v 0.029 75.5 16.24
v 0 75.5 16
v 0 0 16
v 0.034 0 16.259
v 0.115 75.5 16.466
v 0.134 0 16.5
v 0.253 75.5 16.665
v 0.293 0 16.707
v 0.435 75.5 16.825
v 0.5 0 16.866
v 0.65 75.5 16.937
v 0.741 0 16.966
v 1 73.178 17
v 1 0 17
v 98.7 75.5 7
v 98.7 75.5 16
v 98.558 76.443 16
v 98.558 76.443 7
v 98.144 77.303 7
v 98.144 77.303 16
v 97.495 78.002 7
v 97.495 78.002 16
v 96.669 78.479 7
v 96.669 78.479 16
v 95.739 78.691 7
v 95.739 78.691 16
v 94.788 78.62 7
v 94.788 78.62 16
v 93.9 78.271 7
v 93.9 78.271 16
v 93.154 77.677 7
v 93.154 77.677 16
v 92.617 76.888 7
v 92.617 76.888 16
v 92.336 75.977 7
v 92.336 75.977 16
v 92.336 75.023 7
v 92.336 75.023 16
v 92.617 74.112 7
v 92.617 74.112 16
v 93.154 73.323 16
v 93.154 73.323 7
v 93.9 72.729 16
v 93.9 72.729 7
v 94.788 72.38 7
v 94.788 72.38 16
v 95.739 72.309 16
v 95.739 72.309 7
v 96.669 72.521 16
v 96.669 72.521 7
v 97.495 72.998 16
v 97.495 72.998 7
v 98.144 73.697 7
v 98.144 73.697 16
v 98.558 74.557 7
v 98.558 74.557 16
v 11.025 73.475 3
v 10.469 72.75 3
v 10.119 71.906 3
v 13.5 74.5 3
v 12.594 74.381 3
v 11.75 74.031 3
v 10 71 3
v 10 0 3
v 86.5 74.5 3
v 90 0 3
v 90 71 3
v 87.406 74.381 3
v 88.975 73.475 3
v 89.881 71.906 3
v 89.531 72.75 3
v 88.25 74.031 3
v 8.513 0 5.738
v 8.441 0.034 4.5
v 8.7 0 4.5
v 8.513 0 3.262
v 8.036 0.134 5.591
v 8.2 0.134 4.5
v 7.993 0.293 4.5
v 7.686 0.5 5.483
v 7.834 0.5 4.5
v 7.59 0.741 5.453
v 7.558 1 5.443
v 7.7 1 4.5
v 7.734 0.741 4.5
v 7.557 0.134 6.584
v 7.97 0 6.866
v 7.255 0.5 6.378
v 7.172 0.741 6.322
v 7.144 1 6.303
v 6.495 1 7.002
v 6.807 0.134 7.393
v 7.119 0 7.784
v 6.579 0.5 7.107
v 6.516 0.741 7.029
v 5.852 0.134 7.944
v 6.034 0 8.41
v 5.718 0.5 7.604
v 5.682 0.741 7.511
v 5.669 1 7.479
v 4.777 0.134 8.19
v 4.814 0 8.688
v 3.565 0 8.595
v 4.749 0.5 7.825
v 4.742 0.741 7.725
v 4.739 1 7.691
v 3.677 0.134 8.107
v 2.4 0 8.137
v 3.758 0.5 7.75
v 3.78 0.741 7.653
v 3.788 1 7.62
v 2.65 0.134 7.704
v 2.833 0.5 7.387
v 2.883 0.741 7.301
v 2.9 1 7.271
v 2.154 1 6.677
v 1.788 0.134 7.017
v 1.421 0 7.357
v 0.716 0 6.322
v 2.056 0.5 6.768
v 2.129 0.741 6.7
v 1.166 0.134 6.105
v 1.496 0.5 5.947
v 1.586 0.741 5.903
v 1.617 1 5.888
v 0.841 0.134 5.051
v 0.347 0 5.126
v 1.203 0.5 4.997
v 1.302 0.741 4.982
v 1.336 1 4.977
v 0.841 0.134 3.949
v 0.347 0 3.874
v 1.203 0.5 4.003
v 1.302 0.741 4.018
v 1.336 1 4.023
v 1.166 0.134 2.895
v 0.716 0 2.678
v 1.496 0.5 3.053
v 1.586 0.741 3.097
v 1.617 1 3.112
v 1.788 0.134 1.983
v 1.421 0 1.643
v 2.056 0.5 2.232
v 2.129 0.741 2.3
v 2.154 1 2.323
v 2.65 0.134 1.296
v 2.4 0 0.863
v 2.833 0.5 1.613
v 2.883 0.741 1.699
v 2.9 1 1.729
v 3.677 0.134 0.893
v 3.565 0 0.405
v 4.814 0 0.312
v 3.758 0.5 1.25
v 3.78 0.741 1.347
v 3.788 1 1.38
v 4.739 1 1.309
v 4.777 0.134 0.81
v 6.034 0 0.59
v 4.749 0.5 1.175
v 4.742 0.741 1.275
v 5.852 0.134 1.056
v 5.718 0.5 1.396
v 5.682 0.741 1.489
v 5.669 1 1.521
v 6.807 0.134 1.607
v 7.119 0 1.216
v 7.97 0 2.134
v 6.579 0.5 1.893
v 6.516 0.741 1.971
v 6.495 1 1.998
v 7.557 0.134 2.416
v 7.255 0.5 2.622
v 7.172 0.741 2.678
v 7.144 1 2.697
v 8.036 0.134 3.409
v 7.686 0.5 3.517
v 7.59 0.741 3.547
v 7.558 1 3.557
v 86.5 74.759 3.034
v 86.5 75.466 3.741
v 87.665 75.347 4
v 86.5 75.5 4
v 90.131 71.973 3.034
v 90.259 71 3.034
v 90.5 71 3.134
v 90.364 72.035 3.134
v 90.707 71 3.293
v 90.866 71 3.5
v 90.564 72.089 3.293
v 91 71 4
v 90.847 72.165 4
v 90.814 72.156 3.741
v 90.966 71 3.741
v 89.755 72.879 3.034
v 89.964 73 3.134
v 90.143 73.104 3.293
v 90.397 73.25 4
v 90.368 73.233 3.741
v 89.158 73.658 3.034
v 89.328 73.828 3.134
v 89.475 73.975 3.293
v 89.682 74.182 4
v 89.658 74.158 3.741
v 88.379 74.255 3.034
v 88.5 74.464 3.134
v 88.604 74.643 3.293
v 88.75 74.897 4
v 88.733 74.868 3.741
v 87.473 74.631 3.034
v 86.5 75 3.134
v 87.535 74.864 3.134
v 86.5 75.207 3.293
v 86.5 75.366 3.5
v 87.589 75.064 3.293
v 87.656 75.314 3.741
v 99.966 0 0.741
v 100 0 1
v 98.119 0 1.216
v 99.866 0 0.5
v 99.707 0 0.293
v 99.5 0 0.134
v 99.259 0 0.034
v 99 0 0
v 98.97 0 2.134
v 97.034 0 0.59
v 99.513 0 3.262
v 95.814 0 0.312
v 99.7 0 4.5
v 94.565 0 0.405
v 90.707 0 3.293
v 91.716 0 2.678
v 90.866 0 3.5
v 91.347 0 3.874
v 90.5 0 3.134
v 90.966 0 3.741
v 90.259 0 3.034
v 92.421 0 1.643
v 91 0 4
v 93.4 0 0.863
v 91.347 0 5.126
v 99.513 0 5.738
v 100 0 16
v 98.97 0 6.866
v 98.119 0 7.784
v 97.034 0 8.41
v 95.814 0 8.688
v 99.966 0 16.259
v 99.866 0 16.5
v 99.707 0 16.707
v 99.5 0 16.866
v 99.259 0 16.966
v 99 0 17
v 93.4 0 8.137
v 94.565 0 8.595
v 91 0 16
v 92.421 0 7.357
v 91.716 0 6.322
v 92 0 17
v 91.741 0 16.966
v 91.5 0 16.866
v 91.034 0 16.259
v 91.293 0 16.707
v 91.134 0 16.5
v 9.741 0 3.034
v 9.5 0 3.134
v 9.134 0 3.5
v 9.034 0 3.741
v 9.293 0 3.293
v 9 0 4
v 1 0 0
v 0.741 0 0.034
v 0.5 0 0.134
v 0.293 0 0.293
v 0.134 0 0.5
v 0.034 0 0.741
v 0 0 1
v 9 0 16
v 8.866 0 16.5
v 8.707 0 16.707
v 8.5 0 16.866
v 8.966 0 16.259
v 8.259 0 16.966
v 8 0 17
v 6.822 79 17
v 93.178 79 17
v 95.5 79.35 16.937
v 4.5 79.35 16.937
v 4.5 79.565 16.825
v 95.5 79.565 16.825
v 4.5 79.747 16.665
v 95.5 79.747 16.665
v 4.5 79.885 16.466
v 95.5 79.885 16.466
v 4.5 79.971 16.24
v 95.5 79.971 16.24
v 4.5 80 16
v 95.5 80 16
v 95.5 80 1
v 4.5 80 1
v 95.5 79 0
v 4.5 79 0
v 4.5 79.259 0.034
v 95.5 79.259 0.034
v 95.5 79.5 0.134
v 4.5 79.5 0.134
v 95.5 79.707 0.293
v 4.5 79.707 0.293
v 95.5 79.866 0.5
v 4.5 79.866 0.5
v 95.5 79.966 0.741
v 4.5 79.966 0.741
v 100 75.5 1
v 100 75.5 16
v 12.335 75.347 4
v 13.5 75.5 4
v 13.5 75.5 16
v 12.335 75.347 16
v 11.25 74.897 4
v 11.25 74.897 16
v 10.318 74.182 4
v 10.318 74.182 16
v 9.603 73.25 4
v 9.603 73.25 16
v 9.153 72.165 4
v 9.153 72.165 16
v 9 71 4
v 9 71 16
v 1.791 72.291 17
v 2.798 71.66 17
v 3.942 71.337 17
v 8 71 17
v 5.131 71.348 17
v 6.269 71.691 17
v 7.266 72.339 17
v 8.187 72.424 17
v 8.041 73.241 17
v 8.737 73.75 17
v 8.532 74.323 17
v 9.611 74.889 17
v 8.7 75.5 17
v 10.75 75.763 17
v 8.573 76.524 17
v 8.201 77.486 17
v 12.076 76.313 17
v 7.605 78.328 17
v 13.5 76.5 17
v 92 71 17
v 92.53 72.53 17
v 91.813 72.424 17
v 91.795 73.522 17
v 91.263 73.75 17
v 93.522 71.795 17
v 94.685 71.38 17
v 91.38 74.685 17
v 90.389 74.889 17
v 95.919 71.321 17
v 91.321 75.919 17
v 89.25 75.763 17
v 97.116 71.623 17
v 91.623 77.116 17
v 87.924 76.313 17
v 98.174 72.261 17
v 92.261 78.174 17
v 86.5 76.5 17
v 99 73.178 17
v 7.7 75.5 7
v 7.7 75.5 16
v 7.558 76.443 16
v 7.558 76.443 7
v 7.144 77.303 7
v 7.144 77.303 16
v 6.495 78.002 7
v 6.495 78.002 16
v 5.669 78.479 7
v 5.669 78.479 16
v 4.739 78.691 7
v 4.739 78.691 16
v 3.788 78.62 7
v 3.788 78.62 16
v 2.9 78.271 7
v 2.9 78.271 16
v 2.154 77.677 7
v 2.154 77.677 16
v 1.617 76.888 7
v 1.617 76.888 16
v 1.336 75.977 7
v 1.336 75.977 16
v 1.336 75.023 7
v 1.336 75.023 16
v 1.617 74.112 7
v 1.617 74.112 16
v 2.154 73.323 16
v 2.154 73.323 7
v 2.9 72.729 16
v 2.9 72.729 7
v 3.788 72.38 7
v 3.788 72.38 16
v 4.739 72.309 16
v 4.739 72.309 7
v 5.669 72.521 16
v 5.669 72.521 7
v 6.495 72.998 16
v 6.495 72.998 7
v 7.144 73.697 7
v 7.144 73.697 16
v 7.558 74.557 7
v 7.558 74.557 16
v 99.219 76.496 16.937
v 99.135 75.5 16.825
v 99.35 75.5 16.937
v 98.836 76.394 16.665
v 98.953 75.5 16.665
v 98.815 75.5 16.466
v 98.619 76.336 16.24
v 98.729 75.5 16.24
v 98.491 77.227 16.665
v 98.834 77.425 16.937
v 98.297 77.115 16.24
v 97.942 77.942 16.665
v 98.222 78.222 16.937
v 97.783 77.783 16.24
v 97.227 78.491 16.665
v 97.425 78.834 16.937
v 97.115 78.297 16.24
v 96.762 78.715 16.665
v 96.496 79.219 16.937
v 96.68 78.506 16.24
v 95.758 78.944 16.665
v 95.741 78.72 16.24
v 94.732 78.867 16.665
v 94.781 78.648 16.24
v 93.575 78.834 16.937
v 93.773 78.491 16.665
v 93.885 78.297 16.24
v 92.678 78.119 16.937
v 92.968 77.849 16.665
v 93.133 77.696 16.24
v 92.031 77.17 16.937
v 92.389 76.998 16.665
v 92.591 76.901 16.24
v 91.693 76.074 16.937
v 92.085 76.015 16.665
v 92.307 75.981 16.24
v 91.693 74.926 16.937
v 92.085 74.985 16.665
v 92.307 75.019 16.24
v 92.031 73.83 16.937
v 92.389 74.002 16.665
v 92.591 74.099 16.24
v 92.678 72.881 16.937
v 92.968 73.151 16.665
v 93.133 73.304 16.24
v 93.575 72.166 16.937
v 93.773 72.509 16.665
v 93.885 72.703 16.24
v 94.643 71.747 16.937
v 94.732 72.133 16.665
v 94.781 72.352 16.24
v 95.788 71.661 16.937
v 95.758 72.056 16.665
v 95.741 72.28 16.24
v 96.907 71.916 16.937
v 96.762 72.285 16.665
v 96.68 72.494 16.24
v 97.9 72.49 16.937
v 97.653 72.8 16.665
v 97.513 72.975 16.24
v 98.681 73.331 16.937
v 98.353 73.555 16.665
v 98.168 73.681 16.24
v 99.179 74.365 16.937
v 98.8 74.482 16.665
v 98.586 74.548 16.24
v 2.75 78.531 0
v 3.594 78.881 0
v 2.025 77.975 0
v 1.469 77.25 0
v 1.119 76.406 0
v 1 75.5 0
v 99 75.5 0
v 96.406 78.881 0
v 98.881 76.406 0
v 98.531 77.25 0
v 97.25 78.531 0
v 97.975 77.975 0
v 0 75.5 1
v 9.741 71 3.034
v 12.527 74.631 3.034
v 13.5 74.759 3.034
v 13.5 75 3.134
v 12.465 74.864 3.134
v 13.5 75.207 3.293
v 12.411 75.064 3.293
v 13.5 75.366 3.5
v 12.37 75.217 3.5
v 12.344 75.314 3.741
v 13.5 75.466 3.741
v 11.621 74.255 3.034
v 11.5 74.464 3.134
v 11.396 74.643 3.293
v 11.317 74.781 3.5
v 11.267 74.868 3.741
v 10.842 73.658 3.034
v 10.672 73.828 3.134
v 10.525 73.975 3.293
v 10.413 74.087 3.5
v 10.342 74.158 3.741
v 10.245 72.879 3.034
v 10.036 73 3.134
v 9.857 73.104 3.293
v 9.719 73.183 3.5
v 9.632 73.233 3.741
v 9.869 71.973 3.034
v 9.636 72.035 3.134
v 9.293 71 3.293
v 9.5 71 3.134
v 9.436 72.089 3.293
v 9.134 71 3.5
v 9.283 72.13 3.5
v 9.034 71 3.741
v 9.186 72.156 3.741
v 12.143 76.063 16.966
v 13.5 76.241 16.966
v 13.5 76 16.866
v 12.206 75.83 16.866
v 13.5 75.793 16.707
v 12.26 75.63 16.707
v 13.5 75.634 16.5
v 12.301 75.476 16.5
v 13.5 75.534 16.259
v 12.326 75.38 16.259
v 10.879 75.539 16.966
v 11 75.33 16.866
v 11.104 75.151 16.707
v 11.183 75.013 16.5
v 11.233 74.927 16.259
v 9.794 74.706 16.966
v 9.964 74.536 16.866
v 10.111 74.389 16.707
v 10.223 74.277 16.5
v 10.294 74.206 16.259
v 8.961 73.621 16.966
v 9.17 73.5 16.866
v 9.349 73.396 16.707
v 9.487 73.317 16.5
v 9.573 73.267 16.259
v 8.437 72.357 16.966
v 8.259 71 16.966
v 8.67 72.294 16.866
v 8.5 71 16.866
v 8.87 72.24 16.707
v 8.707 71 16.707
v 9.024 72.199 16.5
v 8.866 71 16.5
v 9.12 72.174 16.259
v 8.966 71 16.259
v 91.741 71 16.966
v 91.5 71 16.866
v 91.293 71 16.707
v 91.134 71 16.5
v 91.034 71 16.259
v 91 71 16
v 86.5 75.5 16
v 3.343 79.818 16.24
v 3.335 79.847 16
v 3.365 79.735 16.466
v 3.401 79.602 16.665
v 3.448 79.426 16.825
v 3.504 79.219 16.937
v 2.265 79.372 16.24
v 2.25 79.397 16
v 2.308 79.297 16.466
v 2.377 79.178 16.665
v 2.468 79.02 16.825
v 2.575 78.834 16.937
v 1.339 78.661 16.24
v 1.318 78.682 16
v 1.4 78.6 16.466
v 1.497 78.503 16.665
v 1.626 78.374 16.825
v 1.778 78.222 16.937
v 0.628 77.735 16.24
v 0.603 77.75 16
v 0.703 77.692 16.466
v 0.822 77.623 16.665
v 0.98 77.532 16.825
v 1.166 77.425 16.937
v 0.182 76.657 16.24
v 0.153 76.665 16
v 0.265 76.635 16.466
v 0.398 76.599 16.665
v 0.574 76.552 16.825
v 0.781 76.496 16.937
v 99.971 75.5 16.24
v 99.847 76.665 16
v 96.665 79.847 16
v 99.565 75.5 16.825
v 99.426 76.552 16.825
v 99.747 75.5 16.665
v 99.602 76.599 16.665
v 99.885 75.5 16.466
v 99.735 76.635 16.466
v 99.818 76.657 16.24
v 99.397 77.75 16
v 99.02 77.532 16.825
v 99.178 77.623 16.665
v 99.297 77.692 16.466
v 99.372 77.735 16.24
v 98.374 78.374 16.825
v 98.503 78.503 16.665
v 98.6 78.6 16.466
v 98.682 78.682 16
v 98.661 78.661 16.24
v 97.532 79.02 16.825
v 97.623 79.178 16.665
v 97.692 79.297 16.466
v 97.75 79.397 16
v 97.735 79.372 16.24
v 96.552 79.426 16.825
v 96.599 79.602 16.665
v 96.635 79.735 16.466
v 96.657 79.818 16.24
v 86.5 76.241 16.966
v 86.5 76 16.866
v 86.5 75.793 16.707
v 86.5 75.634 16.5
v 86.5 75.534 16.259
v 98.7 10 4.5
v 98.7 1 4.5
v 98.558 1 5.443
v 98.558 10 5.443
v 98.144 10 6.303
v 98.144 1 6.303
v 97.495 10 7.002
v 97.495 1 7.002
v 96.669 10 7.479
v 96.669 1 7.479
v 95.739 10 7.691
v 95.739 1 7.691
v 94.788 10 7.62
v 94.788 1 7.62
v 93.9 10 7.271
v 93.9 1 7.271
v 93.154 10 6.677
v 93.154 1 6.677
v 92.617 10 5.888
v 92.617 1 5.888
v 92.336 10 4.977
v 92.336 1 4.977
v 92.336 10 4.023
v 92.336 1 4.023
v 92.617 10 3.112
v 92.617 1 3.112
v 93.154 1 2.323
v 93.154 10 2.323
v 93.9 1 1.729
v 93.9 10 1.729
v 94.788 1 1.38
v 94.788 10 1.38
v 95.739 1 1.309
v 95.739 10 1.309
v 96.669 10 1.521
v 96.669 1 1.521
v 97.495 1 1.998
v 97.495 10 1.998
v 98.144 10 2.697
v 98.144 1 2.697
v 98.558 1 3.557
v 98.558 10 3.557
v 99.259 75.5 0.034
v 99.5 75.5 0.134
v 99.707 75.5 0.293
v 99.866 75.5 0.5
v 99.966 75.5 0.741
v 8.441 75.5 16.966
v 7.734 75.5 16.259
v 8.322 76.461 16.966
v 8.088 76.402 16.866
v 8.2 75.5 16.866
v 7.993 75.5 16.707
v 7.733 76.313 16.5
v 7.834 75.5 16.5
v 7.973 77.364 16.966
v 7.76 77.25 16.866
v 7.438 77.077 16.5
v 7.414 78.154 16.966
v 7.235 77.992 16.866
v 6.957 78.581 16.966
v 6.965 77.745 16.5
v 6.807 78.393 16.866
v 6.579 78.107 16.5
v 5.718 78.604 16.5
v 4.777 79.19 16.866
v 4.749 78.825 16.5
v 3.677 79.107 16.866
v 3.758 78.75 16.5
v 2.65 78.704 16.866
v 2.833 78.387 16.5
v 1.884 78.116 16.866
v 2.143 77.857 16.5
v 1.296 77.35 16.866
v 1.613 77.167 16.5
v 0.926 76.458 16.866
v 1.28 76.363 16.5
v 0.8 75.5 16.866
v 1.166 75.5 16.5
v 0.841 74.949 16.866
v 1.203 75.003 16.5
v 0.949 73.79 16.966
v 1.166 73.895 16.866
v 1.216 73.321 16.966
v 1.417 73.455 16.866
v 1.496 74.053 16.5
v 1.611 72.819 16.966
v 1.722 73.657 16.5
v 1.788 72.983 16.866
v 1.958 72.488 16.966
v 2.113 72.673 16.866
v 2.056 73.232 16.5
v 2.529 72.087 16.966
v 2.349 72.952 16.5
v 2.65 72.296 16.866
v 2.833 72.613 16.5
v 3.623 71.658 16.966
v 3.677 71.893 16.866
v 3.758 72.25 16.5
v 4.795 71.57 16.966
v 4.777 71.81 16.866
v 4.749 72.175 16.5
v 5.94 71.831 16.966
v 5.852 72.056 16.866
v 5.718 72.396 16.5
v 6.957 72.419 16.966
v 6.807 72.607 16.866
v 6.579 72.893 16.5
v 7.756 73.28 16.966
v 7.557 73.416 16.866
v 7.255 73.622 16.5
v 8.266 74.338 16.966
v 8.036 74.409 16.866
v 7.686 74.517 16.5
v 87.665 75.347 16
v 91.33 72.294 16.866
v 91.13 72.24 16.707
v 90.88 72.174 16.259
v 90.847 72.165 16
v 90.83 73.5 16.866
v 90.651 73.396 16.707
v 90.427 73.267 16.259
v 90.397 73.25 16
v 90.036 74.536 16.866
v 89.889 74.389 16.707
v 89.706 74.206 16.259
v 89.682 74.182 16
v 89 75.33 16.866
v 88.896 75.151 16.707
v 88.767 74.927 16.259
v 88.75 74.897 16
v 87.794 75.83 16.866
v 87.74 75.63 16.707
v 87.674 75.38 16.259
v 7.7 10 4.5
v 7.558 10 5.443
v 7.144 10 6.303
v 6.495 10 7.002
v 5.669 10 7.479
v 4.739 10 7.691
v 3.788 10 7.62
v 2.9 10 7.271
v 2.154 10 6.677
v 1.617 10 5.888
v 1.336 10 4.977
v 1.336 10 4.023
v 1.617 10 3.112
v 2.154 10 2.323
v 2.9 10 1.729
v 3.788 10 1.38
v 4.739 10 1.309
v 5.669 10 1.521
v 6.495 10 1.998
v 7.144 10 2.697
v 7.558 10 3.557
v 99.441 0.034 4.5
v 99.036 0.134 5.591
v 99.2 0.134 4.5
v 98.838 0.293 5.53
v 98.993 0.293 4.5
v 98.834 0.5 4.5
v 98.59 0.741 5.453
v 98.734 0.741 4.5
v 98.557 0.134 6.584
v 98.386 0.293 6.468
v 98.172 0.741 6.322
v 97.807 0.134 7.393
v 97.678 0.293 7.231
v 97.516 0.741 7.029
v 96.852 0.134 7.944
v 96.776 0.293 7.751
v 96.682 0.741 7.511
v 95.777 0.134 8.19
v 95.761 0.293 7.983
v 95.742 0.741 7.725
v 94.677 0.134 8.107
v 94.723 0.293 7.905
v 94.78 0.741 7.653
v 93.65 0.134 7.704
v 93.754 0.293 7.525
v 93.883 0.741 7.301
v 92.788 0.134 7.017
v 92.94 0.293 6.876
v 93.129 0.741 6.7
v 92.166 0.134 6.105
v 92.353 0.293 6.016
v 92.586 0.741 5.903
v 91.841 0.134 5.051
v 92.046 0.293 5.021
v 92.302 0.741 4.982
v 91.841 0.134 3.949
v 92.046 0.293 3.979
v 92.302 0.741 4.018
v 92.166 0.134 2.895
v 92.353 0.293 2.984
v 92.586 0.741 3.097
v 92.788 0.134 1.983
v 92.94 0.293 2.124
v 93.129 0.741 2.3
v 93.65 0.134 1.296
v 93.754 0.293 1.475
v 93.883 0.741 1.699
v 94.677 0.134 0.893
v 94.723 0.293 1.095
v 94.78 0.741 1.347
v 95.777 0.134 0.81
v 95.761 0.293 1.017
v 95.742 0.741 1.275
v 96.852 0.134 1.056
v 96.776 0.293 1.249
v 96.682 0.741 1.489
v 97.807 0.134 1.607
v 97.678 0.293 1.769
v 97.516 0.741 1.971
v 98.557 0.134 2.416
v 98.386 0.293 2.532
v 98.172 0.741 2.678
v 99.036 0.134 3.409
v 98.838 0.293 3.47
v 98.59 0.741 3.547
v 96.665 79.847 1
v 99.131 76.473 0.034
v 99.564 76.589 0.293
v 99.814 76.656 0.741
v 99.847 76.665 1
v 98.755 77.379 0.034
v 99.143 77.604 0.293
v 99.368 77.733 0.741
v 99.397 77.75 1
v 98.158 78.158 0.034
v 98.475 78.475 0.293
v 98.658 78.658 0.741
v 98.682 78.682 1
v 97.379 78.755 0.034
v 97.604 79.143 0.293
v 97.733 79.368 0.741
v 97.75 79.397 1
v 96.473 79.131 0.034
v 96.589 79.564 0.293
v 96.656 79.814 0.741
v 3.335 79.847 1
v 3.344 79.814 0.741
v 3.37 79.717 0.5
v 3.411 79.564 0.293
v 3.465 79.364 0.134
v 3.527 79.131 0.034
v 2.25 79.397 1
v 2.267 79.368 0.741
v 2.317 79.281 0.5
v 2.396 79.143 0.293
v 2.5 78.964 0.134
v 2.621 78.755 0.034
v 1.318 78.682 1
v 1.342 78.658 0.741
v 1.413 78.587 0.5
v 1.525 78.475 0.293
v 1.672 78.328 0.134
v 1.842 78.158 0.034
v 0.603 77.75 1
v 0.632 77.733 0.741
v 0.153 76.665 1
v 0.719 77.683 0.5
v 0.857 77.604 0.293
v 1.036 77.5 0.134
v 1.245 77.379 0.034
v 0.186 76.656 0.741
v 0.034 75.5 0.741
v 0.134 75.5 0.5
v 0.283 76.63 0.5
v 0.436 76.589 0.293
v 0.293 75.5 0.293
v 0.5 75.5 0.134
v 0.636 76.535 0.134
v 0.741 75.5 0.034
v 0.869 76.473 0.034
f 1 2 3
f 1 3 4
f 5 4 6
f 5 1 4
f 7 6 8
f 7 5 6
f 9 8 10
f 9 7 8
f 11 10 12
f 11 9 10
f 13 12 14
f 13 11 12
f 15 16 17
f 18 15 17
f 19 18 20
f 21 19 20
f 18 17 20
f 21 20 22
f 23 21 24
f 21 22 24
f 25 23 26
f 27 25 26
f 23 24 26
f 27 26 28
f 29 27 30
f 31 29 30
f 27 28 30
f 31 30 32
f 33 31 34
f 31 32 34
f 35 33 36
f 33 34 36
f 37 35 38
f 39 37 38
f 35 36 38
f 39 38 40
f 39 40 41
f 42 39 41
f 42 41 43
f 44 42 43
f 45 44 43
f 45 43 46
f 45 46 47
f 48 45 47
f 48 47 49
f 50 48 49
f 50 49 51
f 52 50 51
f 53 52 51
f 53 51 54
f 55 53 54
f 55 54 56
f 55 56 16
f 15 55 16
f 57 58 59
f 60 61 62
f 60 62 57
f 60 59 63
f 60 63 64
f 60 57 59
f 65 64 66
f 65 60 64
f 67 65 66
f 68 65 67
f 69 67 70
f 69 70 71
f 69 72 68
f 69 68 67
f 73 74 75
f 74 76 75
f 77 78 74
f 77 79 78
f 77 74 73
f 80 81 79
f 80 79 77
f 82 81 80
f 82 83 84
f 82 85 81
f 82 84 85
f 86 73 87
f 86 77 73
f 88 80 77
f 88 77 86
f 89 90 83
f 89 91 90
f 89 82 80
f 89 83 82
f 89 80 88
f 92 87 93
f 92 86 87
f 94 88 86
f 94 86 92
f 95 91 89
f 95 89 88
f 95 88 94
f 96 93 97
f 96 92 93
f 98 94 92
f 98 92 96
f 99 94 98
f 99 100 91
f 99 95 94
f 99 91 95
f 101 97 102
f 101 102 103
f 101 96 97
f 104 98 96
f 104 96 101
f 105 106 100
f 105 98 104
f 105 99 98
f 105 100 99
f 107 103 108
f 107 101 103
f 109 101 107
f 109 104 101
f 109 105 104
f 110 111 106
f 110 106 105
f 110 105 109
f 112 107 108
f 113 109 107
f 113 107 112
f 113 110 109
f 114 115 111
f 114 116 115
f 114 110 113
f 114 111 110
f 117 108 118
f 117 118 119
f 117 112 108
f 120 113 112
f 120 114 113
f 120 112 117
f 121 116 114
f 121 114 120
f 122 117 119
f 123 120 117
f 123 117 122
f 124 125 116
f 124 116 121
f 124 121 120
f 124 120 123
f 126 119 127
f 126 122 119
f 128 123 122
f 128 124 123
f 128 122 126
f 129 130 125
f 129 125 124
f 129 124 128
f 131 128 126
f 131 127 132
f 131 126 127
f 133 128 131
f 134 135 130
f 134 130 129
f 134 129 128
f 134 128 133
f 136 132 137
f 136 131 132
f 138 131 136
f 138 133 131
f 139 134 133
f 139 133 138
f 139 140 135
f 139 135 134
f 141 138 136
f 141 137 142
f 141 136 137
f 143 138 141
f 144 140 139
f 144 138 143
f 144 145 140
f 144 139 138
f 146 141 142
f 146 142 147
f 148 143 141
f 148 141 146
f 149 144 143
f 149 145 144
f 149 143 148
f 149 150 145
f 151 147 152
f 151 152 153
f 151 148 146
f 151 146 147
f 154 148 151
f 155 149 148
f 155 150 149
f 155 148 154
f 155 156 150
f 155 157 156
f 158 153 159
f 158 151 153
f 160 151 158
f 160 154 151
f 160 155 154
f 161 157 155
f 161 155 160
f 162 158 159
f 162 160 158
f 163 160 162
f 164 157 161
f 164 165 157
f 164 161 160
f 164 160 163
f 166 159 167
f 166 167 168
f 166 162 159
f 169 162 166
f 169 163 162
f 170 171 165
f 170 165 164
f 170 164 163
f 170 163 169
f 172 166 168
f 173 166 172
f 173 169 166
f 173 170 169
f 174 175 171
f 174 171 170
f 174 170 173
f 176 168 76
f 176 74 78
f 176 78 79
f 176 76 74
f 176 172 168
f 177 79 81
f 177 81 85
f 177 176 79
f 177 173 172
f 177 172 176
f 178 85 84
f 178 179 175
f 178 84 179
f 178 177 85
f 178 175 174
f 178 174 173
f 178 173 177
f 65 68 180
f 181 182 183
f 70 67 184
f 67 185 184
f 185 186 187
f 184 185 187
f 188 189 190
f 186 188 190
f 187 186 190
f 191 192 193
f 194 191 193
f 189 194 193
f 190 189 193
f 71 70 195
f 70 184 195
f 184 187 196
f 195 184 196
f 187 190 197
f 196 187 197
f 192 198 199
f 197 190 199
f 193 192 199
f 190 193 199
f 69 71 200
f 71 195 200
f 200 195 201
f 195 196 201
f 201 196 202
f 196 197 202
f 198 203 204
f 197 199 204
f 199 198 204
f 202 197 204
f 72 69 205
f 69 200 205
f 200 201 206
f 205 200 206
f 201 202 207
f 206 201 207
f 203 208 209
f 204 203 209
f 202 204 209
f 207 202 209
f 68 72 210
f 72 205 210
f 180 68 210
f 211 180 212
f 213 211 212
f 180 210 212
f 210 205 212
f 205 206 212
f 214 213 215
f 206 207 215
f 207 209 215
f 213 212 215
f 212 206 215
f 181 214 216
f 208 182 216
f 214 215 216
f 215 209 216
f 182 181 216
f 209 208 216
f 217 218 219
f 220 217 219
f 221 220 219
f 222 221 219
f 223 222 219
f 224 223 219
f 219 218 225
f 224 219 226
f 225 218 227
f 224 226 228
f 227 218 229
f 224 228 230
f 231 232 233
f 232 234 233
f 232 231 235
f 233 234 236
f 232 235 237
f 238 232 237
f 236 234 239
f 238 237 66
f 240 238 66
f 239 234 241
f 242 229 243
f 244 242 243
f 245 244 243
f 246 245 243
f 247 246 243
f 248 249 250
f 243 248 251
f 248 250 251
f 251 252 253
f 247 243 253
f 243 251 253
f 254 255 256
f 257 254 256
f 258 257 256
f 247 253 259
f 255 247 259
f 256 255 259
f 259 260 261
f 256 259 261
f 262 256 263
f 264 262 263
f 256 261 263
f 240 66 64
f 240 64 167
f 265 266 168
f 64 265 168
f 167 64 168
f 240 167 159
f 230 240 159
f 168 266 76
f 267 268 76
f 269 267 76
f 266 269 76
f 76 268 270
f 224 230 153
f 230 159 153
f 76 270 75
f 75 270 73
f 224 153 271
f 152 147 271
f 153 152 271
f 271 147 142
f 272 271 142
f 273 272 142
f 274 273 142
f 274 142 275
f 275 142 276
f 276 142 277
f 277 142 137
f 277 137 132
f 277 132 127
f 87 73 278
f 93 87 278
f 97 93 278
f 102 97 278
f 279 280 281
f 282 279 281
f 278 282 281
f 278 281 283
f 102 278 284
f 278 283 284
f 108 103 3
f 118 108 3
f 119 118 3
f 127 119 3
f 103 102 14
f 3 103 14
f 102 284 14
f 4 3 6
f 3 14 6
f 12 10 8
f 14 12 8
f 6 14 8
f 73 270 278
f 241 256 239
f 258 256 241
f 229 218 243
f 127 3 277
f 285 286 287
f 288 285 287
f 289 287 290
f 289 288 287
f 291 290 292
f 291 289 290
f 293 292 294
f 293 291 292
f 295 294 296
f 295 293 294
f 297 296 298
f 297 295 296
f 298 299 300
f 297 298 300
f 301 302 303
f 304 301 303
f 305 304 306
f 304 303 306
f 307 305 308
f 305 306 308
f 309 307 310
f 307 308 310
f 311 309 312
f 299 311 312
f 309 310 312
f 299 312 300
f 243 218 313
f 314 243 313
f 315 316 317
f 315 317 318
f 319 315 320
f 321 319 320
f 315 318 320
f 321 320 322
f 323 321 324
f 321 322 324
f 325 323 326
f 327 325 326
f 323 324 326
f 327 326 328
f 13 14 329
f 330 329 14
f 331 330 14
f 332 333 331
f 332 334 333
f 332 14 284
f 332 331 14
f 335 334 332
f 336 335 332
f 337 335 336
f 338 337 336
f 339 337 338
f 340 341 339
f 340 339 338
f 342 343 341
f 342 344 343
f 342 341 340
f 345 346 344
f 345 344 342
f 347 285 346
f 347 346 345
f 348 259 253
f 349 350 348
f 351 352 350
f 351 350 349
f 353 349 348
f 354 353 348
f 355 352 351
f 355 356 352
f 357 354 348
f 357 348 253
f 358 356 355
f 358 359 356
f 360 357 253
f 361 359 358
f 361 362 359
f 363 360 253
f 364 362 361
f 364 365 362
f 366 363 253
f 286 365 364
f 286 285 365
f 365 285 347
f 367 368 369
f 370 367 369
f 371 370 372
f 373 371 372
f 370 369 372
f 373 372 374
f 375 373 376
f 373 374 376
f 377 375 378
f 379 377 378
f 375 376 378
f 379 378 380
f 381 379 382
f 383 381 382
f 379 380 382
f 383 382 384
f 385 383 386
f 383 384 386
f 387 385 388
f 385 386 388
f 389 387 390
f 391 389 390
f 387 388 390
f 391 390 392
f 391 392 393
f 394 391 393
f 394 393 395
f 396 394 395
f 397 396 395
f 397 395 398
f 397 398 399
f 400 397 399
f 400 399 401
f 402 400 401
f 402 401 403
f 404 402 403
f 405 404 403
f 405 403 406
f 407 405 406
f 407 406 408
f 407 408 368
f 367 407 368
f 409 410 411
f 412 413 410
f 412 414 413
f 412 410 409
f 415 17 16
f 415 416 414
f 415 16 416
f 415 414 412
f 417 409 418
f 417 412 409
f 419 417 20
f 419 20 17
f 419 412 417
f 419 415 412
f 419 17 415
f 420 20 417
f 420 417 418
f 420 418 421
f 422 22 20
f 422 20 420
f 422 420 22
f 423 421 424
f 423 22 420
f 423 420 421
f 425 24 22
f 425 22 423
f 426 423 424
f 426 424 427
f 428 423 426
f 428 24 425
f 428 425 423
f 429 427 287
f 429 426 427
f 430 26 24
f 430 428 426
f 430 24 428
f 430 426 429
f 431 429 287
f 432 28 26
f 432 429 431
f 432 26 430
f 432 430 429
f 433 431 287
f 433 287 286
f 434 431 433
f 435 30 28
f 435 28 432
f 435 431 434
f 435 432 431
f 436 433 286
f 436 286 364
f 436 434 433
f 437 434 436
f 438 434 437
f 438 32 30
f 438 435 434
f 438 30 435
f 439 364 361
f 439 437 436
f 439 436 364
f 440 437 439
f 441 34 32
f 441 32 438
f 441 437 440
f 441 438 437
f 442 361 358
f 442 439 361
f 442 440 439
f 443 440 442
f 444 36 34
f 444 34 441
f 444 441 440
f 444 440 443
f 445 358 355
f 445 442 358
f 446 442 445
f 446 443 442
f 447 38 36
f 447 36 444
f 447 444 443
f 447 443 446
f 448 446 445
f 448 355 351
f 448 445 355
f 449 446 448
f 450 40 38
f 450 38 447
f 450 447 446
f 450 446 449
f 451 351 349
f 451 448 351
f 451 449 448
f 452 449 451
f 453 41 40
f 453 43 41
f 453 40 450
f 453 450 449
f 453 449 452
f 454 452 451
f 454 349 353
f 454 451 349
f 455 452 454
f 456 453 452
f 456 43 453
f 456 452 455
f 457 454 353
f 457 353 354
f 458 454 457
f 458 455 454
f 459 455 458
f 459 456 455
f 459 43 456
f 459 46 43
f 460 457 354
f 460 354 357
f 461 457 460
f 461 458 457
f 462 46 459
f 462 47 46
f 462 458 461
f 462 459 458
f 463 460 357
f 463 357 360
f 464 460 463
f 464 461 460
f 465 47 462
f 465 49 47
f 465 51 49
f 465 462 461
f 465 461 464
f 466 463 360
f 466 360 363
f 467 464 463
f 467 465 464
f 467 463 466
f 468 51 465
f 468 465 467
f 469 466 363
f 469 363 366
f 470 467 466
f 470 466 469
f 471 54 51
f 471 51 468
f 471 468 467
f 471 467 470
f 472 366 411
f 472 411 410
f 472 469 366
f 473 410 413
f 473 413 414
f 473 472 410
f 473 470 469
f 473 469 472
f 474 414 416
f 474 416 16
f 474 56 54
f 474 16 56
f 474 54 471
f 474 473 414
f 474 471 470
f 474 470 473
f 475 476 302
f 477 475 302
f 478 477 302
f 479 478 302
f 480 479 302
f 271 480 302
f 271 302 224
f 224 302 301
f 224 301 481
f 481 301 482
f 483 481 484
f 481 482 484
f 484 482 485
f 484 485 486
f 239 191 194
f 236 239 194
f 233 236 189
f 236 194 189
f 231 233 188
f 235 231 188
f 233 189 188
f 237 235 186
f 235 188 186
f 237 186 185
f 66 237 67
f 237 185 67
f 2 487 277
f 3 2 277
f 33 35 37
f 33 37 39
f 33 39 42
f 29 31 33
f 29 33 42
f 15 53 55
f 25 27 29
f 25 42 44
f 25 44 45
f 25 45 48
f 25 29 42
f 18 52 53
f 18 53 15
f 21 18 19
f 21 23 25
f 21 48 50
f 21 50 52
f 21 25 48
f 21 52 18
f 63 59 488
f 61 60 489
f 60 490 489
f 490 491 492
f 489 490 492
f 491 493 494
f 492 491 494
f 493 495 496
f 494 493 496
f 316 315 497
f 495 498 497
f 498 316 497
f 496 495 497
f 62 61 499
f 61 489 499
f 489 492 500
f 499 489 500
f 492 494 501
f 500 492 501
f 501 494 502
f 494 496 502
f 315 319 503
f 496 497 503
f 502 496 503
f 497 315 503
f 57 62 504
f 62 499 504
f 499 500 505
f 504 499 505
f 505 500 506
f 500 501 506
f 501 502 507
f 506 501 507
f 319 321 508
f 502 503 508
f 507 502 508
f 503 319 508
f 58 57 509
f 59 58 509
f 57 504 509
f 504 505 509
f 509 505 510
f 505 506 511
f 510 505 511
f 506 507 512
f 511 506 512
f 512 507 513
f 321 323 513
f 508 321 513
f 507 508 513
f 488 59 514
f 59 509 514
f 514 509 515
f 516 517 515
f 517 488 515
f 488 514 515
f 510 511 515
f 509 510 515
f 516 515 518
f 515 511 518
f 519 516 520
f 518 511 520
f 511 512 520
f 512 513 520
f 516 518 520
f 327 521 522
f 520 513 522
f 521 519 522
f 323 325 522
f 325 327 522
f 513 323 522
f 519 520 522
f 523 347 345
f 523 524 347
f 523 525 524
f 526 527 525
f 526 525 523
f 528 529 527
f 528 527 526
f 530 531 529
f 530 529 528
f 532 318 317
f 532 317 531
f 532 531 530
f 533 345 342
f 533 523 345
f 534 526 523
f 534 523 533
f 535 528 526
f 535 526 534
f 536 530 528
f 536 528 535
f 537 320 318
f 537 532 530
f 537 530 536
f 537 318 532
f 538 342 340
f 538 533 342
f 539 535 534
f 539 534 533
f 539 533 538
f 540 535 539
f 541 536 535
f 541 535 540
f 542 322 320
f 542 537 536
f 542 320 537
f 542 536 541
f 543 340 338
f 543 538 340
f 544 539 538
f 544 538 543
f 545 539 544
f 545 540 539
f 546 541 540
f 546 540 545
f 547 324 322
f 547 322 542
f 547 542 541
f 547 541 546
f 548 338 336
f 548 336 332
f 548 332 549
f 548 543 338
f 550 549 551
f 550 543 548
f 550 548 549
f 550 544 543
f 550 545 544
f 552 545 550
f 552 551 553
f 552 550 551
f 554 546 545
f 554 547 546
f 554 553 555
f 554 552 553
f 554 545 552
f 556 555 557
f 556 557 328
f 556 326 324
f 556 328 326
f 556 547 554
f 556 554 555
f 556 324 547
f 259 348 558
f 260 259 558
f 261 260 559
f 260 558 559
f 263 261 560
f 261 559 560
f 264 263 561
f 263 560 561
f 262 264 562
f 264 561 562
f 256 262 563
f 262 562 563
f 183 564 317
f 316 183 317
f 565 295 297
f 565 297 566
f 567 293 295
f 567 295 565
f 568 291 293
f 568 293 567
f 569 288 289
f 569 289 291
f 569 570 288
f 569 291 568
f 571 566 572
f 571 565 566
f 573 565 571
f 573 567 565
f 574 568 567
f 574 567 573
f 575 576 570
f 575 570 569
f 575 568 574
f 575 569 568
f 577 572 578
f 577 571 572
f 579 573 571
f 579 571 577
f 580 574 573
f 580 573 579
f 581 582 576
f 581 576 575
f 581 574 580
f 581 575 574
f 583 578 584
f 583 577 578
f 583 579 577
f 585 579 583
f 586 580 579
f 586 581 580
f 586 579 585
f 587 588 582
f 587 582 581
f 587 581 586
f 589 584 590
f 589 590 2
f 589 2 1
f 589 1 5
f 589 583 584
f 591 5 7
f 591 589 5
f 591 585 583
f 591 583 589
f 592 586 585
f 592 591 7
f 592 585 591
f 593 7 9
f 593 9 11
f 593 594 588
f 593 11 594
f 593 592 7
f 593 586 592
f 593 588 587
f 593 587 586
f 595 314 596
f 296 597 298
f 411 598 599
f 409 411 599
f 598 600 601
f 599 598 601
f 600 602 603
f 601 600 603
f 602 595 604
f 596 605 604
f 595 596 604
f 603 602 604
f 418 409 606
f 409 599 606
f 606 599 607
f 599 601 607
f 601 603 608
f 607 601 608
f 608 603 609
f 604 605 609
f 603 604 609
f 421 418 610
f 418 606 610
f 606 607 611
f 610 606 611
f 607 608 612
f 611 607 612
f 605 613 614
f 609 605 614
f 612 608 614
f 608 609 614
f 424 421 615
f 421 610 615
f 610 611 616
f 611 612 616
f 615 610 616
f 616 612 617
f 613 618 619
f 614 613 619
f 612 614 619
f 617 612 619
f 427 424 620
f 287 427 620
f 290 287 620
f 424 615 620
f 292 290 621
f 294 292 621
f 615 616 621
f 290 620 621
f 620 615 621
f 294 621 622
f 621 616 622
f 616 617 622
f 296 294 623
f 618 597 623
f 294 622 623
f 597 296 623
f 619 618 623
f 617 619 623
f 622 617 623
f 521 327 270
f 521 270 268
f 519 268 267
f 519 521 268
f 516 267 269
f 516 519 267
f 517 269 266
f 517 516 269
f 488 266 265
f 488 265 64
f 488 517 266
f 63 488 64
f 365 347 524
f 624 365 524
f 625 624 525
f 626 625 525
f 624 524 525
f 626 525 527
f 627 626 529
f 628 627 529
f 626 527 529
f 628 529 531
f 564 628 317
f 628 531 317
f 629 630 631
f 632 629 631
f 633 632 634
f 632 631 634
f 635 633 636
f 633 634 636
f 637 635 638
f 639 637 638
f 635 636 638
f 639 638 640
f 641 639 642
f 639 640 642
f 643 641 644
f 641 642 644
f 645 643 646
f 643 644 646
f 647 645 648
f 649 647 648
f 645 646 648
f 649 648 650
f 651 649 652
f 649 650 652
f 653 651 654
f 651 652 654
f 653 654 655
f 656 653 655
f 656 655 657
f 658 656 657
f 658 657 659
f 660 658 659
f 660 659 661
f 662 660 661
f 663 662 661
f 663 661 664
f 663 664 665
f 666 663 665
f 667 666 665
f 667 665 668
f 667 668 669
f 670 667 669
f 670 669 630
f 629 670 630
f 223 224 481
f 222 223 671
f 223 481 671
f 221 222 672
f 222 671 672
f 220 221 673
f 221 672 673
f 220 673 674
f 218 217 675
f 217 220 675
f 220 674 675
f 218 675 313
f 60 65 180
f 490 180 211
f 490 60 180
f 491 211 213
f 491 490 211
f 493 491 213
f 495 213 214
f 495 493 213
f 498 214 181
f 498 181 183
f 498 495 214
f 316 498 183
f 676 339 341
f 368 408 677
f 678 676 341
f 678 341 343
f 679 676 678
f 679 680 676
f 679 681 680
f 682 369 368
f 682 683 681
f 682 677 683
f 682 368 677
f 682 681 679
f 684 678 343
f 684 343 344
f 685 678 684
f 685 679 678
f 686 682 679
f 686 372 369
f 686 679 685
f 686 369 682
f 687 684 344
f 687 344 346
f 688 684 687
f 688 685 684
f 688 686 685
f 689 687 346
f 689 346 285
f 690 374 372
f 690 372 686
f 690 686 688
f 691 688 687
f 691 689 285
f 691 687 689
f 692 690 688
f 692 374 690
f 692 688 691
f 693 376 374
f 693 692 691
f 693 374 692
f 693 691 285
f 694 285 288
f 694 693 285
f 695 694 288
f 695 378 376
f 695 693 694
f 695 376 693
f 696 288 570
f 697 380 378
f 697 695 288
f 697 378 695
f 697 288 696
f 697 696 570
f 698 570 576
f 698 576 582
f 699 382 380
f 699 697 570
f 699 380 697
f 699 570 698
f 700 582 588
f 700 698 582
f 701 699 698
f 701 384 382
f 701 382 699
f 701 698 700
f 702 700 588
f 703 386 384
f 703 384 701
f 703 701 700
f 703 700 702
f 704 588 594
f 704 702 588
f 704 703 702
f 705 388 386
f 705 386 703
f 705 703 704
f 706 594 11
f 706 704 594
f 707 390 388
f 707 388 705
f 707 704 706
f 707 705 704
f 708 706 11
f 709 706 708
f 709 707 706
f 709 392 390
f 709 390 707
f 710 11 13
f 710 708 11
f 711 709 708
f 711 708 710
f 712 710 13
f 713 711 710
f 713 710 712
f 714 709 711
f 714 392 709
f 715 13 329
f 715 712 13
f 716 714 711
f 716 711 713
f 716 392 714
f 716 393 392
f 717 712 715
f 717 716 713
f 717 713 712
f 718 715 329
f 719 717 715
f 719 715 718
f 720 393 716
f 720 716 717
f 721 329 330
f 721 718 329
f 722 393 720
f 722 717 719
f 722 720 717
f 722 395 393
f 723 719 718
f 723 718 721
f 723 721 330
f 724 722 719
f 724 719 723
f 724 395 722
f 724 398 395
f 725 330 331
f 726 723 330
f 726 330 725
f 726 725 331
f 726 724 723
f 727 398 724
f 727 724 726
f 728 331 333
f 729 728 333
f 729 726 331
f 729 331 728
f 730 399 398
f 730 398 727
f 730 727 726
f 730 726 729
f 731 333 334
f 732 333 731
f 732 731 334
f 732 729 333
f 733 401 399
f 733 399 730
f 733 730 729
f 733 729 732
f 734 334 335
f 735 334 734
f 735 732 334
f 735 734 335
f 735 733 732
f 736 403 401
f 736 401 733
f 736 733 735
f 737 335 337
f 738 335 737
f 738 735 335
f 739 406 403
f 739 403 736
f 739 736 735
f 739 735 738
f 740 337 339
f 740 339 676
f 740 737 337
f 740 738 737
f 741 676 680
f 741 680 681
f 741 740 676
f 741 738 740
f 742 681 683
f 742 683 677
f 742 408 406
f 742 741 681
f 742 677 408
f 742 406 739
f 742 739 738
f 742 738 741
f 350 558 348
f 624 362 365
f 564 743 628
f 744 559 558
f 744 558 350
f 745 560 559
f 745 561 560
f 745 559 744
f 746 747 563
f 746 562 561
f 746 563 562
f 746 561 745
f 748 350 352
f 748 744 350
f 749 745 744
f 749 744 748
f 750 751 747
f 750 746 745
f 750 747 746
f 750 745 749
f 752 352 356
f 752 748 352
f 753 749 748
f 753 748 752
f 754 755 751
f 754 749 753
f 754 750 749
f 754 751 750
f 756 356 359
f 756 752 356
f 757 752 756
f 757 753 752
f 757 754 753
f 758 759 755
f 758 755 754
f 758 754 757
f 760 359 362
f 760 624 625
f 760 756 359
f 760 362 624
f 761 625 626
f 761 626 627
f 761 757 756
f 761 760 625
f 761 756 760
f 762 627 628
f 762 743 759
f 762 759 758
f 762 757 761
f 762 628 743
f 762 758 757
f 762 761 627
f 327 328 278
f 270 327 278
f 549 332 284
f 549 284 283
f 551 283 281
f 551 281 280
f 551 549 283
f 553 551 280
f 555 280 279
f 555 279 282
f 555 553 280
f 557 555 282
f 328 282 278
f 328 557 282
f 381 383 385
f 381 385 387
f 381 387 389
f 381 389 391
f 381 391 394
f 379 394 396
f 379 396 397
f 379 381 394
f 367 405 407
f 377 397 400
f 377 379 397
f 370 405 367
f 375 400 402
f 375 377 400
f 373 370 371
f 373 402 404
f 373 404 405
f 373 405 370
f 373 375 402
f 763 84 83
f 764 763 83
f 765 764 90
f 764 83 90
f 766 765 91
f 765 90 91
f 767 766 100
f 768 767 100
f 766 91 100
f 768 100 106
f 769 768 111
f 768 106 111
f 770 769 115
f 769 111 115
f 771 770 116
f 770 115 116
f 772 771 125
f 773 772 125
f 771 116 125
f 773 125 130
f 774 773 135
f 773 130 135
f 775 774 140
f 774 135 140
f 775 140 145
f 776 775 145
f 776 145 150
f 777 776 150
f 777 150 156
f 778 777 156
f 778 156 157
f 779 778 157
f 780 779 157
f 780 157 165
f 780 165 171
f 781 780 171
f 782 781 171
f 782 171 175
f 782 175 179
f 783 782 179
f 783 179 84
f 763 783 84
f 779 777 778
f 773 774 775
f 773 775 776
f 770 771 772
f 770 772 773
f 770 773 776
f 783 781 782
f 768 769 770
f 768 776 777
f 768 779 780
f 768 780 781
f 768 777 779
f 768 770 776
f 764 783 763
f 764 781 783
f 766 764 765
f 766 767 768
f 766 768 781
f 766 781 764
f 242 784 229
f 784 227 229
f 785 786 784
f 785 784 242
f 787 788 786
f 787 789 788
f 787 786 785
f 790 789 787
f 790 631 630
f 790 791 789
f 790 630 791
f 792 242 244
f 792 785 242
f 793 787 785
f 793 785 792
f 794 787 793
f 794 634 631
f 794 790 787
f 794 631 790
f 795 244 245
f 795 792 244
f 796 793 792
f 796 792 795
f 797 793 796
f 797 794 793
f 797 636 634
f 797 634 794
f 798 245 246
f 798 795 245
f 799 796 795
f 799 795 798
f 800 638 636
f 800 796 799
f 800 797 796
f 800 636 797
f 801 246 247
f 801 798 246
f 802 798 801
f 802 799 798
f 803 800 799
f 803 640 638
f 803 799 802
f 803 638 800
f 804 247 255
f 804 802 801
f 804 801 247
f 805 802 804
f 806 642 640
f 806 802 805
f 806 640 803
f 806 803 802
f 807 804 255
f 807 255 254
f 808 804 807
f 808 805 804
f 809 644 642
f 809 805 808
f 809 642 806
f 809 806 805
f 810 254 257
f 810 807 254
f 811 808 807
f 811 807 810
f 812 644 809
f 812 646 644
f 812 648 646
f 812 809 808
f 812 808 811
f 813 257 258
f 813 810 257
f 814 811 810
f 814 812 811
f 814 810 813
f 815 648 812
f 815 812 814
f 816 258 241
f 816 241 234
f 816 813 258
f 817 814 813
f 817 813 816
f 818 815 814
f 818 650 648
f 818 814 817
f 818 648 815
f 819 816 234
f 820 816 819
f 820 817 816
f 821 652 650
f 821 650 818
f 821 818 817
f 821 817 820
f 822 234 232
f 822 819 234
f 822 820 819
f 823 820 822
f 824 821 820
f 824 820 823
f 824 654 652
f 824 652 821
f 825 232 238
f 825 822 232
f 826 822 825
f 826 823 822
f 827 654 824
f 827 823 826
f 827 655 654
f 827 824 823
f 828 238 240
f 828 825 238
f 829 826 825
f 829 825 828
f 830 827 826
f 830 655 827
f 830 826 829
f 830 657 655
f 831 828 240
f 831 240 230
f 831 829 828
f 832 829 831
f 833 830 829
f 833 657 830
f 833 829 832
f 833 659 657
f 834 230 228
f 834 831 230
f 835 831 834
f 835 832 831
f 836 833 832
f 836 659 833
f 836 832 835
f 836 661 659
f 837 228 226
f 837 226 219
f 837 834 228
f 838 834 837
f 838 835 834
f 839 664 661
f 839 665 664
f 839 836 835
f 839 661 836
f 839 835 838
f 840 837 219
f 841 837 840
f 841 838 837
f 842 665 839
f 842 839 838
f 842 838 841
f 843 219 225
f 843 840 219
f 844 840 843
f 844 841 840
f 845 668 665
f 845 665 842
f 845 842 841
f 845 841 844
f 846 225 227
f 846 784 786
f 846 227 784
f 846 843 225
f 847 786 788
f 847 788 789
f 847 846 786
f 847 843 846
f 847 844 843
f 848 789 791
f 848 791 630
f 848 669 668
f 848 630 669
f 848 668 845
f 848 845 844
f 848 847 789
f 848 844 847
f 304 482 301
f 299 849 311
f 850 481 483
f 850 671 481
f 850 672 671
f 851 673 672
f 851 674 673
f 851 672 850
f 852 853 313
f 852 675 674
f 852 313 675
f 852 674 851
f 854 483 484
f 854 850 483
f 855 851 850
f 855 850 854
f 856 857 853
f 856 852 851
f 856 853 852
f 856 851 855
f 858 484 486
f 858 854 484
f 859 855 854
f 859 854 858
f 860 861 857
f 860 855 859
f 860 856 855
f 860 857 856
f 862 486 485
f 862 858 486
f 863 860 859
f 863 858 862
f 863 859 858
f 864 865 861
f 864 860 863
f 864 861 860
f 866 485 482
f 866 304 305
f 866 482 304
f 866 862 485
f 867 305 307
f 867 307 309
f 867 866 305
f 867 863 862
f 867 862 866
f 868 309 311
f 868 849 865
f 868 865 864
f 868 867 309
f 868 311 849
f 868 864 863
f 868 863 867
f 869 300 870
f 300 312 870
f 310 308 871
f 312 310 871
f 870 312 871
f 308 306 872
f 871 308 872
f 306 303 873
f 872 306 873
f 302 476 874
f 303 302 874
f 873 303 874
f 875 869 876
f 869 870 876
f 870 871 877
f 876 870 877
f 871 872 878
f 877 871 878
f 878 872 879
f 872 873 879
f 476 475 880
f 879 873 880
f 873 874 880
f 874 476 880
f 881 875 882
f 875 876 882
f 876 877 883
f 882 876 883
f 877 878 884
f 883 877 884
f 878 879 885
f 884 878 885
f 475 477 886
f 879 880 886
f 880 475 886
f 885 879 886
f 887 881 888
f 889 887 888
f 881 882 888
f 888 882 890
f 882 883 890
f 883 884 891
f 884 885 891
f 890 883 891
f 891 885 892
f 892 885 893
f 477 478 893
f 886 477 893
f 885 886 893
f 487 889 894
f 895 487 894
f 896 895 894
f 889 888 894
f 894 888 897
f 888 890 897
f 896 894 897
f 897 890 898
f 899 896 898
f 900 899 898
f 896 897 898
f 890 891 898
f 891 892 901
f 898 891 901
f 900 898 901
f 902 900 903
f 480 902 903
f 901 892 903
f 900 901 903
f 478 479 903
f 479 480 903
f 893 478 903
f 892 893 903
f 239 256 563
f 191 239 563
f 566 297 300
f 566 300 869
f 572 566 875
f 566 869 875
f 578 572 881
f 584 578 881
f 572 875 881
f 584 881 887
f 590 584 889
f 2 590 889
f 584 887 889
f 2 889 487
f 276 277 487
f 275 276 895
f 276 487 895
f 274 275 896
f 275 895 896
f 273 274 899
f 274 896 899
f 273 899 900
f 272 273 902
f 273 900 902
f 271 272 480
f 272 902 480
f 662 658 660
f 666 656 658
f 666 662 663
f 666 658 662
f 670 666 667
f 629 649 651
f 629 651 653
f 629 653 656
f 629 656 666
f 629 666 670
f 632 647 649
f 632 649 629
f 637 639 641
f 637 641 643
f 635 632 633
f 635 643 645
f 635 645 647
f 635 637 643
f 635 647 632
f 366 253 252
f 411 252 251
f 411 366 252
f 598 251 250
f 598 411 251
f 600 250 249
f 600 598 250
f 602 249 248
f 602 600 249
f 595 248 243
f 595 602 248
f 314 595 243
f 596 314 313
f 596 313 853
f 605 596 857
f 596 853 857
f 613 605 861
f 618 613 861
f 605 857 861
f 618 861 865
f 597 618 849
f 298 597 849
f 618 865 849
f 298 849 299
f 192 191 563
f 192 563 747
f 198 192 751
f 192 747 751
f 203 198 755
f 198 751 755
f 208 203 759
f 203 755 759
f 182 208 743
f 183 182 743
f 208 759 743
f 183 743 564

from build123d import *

# Parameters (mm, degrees)
F1_DEPTH     = 17
F5_DEPTH     = 14
F3_R         = 3.2
F6_DEPTH     = 10
F4_R         = 3.2
F7_DEPTH     = 10
F8_T1_DEPTH  = 73
F8_T3_DEPTH  = 71
F8_T6_ANGLE  = 90
F8_T8_ANGLE  = 90
F8_T9_DEPTH  = 78
F8_T11_DEPTH = 73.5
F8_T13_DEPTH = 73
F8_T15_DEPTH = 91
F8_T26_ANGLE = 90
F8_T28_ANGLE = 90
F8_T30_ANGLE = 90
F8_T32_ANGLE = 90
F8_T34_ANGLE = 90
F8_T36_ANGLE = 90


# Not quite as in the source:
# - a fillet or chamfer that OpenCascade refuses, or shapes differently, is made with other operations: its cross-section is extruded or revolved along the edge and cut away or added


with BuildPart() as f1:
    # F0 (on Top) → F1 (new body)
    with BuildSketch(Plane.XY):
        with BuildLine():
            Line((0, 75.5), (0, 0))
            Line((0, 0), (50, 0))
            Line((50, 0), (100, 0))
            Line((100, 0), (100, 75.5))
            ThreePointArc((100, 75.5), (98.6819805153, 78.6819805153), (95.5, 80))
            Line((95.5, 80), (50, 80))
            Line((50, 80), (4.5, 80))
            ThreePointArc((4.5, 80), (1.3180194847, 78.6819805153), (0, 75.5))
        make_face()
    extrude(amount=F1_DEPTH)

    # F3 (on offset) → F5 (cut)
    with BuildSketch(Plane.XY.offset(17)):
        with BuildLine():
            Line((9, 71), (9, 0))
            Line((9, 0), (50, 0))
            Line((50, 0), (91, 0))
            Line((91, 0), (91, 71))
            ThreePointArc((91, 71), (89.6819805153, 74.1819805153), (86.5, 75.5))
            Line((86.5, 75.5), (50, 75.5))
            Line((50, 75.5), (13.5, 75.5))
            ThreePointArc((13.5, 75.5), (10.3180194847, 74.1819805153), (9, 71))
        make_face()
    extrude(amount=-F5_DEPTH, mode=Mode.SUBTRACT)

    # F3 (on offset) → F6 (cut)
    with BuildSketch(Plane.XY.offset(17)):
        with Locations((4.5, 75.5)):
            Circle(F3_R)
        with Locations((95.5, 75.5)):
            Circle(F3_R)
    extrude(amount=-F6_DEPTH, mode=Mode.SUBTRACT)

    # F4 (on Front) → F7 (cut)
    with BuildSketch(Plane.XZ):
        with Locations((4.5, 4.5)):
            Circle(F4_R)
        with Locations((95.5, 4.5)):
            Circle(F4_R)
    extrude(amount=-F7_DEPTH, mode=Mode.SUBTRACT)

    # F8: fillet of radius 1 on 8 edges, made by hand

    # F8_s2 → F8_t1 (join)
    with BuildSketch(Plane.YZ.offset(13.5)):
        with BuildLine():
            ThreePointArc((74.5, 3), (75.2071067812, 3.2928932188), (75.5, 4))
            Line((75.5, 4), (75.5, 3))
            Line((75.5, 3), (74.5, 3))
        make_face()
    extrude(amount=F8_T1_DEPTH)

    # F8_s4 → F8_t3 (join)
    with BuildSketch(Plane.XZ.offset(-71)):
        with BuildLine():
            ThreePointArc((9, 4), (9.2928932188, 3.2928932188), (10, 3))
            Line((10, 3), (9, 3))
            Line((9, 3), (9, 4))
        make_face()
        with BuildLine():
            ThreePointArc((91, 4), (90.7071067812, 3.2928932188), (90, 3))
            Line((90, 3), (91, 3))
            Line((91, 3), (91, 4))
        make_face()
    extrude(amount=F8_T3_DEPTH)

    # F8_s5 → F8_t6 (revolve)
    with BuildSketch(Plane.XZ.offset(-71)):
        with BuildLine():
            ThreePointArc((90, 3), (90.7071067812, 3.2928932188), (91, 4))
            Line((91, 4), (91, 3))
            Line((91, 3), (90, 3))
        make_face()
    revolve(axis=Axis((86.5, 71, 3), (0, 0, 1)), revolution_arc=F8_T6_ANGLE)

    # F8_s7 → F8_t8 (revolve)
    with BuildSketch(Plane.YZ.offset(13.5)):
        with BuildLine():
            ThreePointArc((74.5, 3), (75.2071067812, 3.2928932188), (75.5, 4))
            Line((75.5, 4), (75.5, 3))
            Line((75.5, 3), (74.5, 3))
        make_face()
    revolve(axis=Axis((13.5, 71, 3), (0, 0, 1)), revolution_arc=F8_T8_ANGLE)

    # F8_s10 → F8_t9 (cut)
    with BuildSketch(Plane.XZ.offset(-75.5)):
        with BuildLine():
            ThreePointArc((99, 17), (99.7071067812, 16.7071067812), (100, 16))
            Line((100, 16), (100, 17))
            Line((100, 17), (99, 17))
        make_face()
        with BuildLine():
            ThreePointArc((99, 0), (99.7071067812, 0.2928932188), (100, 1))
            Line((100, 1), (100, 0))
            Line((100, 0), (99, 0))
        make_face()
        with BuildLine():
            ThreePointArc((0, 1), (0.2928932188, 0.2928932188), (1, 0))
            Line((1, 0), (0, 0))
            Line((0, 0), (0, 1))
        make_face()
        with BuildLine():
            ThreePointArc((0, 16), (0.2928932188, 16.7071067812), (1, 17))
            Line((1, 17), (0, 17))
            Line((0, 17), (0, 16))
        make_face()
    extrude(amount=F8_T9_DEPTH, mode=Mode.SUBTRACT)

    # F8_s12 → F8_t11 (cut)
    with BuildSketch(Plane.XZ.offset(-71)):
        with BuildLine():
            ThreePointArc((8, 17), (8.7071067812, 16.7071067812), (9, 16))
            Line((9, 16), (9, 17))
            Line((9, 17), (8, 17))
        make_face()
        with BuildLine():
            ThreePointArc((92, 17), (91.2928932188, 16.7071067812), (91, 16))
            Line((91, 16), (91, 17))
            Line((91, 17), (92, 17))
        make_face()
    extrude(amount=F8_T11_DEPTH, mode=Mode.SUBTRACT)

    # F8_s14 → F8_t13 (cut)
    with BuildSketch(Plane.YZ.offset(13.5)):
        with BuildLine():
            ThreePointArc((76.5, 17), (75.7928932188, 16.7071067812), (75.5, 16))
            Line((75.5, 16), (75.5, 17))
            Line((75.5, 17), (76.5, 17))
        make_face()
    extrude(amount=F8_T13_DEPTH, mode=Mode.SUBTRACT)

    # F8_s16 → F8_t15 (cut)
    with BuildSketch(Plane.YZ.offset(4.5)):
        with BuildLine():
            ThreePointArc((79, 0), (79.7071067812, 0.2928932188), (80, 1))
            Line((80, 1), (80, 0))
            Line((80, 0), (79, 0))
        make_face()
        with BuildLine():
            ThreePointArc((79, 17), (79.7071067812, 16.7071067812), (80, 16))
            Line((80, 16), (80, 17))
            Line((80, 17), (79, 17))
        make_face()
    extrude(amount=F8_T15_DEPTH, mode=Mode.SUBTRACT)

    # F8_s17 → F8_t18 (revolve, cut)
    with BuildSketch(Plane.XY.offset(4.5)):
        with BuildLine():
            ThreePointArc((8.7, 0), (7.9928932188, 0.2928932188), (7.7, 1))
            Line((7.7, 1), (7.7, 0))
            Line((7.7, 0), (8.7, 0))
        make_face()
    revolve(axis=Axis((4.5, 0, 4.5), (0, -1, 0)), mode=Mode.SUBTRACT)

    # F8_s19 → F8_t20 (revolve, cut)
    with BuildSketch(Plane.XY.offset(4.5)):
        with BuildLine():
            ThreePointArc((99.7, 0), (98.9928932188, 0.2928932188), (98.7, 1))
            Line((98.7, 1), (98.7, 0))
            Line((98.7, 0), (99.7, 0))
        make_face()
    revolve(axis=Axis((95.5, 0, 4.5), (0, -1, 0)), mode=Mode.SUBTRACT)

    # F8_s21 → F8_t22 (revolve, cut)
    with BuildSketch(Plane.XZ.offset(-75.5)):
        with BuildLine():
            ThreePointArc((99.7, 17), (98.9928932188, 16.7071067812), (98.7, 16))
            Line((98.7, 16), (98.7, 17))
            Line((98.7, 17), (99.7, 17))
        make_face()
    revolve(axis=Axis((95.5, 75.5, 17), (0, 0, 1)), mode=Mode.SUBTRACT)

    # F8_s23 → F8_t24 (revolve, cut)
    with BuildSketch(Plane.XZ.offset(-75.5)):
        with BuildLine():
            ThreePointArc((8.7, 17), (7.9928932188, 16.7071067812), (7.7, 16))
            Line((7.7, 16), (7.7, 17))
            Line((7.7, 17), (8.7, 17))
        make_face()
    revolve(axis=Axis((4.5, 75.5, 17), (0, 0, 1)), mode=Mode.SUBTRACT)

    # F8_s25 → F8_t26 (revolve, cut)
    with BuildSketch(Plane.YZ.offset(13.5)):
        with BuildLine():
            ThreePointArc((76.5, 17), (75.7928932188, 16.7071067812), (75.5, 16))
            Line((75.5, 16), (75.5, 17))
            Line((75.5, 17), (76.5, 17))
        make_face()
    revolve(axis=Axis((13.5, 71, 17), (0, 0, 1)), revolution_arc=F8_T26_ANGLE, mode=Mode.SUBTRACT)

    # F8_s27 → F8_t28 (revolve, cut)
    with BuildSketch(Plane.XZ.offset(-71)):
        with BuildLine():
            ThreePointArc((92, 17), (91.2928932188, 16.7071067812), (91, 16))
            Line((91, 16), (91, 17))
            Line((91, 17), (92, 17))
        make_face()
    revolve(axis=Axis((86.5, 71, 17), (0, 0, 1)), revolution_arc=F8_T28_ANGLE, mode=Mode.SUBTRACT)

    # F8_s29 → F8_t30 (revolve, cut)
    with BuildSketch(Plane.XZ.offset(-75.5)):
        with BuildLine():
            ThreePointArc((99, 0), (99.7071067812, 0.2928932188), (100, 1))
            Line((100, 1), (100, 0))
            Line((100, 0), (99, 0))
        make_face()
    revolve(axis=Axis((95.5, 75.5, 0), (0, 0, 1)), revolution_arc=F8_T30_ANGLE, mode=Mode.SUBTRACT)

    # F8_s31 → F8_t32 (revolve, cut)
    with BuildSketch(Plane.YZ.offset(4.5)):
        with BuildLine():
            ThreePointArc((80, 1), (79.7071067812, 0.2928932188), (79, 0))
            Line((79, 0), (80, 0))
            Line((80, 0), (80, 1))
        make_face()
    revolve(axis=Axis((4.5, 75.5, 0), (0, 0, 1)), revolution_arc=F8_T32_ANGLE, mode=Mode.SUBTRACT)

    # F8_s33 → F8_t34 (revolve, cut)
    with BuildSketch(Plane.XZ.offset(-75.5)):
        with BuildLine():
            ThreePointArc((99, 17), (99.7071067812, 16.7071067812), (100, 16))
            Line((100, 16), (100, 17))
            Line((100, 17), (99, 17))
        make_face()
    revolve(axis=Axis((95.5, 75.5, 17), (0, 0, 1)), revolution_arc=F8_T34_ANGLE, mode=Mode.SUBTRACT)

    # F8_s35 → F8_t36 (revolve, cut)
    with BuildSketch(Plane.YZ.offset(4.5)):
        with BuildLine():
            ThreePointArc((80, 16), (79.7071067812, 16.7071067812), (79, 17))
            Line((79, 17), (80, 17))
            Line((80, 17), (80, 16))
        make_face()
    revolve(axis=Axis((4.5, 75.5, 17), (0, 0, 1)), revolution_arc=F8_T36_ANGLE, mode=Mode.SUBTRACT)


solid = f1.part
